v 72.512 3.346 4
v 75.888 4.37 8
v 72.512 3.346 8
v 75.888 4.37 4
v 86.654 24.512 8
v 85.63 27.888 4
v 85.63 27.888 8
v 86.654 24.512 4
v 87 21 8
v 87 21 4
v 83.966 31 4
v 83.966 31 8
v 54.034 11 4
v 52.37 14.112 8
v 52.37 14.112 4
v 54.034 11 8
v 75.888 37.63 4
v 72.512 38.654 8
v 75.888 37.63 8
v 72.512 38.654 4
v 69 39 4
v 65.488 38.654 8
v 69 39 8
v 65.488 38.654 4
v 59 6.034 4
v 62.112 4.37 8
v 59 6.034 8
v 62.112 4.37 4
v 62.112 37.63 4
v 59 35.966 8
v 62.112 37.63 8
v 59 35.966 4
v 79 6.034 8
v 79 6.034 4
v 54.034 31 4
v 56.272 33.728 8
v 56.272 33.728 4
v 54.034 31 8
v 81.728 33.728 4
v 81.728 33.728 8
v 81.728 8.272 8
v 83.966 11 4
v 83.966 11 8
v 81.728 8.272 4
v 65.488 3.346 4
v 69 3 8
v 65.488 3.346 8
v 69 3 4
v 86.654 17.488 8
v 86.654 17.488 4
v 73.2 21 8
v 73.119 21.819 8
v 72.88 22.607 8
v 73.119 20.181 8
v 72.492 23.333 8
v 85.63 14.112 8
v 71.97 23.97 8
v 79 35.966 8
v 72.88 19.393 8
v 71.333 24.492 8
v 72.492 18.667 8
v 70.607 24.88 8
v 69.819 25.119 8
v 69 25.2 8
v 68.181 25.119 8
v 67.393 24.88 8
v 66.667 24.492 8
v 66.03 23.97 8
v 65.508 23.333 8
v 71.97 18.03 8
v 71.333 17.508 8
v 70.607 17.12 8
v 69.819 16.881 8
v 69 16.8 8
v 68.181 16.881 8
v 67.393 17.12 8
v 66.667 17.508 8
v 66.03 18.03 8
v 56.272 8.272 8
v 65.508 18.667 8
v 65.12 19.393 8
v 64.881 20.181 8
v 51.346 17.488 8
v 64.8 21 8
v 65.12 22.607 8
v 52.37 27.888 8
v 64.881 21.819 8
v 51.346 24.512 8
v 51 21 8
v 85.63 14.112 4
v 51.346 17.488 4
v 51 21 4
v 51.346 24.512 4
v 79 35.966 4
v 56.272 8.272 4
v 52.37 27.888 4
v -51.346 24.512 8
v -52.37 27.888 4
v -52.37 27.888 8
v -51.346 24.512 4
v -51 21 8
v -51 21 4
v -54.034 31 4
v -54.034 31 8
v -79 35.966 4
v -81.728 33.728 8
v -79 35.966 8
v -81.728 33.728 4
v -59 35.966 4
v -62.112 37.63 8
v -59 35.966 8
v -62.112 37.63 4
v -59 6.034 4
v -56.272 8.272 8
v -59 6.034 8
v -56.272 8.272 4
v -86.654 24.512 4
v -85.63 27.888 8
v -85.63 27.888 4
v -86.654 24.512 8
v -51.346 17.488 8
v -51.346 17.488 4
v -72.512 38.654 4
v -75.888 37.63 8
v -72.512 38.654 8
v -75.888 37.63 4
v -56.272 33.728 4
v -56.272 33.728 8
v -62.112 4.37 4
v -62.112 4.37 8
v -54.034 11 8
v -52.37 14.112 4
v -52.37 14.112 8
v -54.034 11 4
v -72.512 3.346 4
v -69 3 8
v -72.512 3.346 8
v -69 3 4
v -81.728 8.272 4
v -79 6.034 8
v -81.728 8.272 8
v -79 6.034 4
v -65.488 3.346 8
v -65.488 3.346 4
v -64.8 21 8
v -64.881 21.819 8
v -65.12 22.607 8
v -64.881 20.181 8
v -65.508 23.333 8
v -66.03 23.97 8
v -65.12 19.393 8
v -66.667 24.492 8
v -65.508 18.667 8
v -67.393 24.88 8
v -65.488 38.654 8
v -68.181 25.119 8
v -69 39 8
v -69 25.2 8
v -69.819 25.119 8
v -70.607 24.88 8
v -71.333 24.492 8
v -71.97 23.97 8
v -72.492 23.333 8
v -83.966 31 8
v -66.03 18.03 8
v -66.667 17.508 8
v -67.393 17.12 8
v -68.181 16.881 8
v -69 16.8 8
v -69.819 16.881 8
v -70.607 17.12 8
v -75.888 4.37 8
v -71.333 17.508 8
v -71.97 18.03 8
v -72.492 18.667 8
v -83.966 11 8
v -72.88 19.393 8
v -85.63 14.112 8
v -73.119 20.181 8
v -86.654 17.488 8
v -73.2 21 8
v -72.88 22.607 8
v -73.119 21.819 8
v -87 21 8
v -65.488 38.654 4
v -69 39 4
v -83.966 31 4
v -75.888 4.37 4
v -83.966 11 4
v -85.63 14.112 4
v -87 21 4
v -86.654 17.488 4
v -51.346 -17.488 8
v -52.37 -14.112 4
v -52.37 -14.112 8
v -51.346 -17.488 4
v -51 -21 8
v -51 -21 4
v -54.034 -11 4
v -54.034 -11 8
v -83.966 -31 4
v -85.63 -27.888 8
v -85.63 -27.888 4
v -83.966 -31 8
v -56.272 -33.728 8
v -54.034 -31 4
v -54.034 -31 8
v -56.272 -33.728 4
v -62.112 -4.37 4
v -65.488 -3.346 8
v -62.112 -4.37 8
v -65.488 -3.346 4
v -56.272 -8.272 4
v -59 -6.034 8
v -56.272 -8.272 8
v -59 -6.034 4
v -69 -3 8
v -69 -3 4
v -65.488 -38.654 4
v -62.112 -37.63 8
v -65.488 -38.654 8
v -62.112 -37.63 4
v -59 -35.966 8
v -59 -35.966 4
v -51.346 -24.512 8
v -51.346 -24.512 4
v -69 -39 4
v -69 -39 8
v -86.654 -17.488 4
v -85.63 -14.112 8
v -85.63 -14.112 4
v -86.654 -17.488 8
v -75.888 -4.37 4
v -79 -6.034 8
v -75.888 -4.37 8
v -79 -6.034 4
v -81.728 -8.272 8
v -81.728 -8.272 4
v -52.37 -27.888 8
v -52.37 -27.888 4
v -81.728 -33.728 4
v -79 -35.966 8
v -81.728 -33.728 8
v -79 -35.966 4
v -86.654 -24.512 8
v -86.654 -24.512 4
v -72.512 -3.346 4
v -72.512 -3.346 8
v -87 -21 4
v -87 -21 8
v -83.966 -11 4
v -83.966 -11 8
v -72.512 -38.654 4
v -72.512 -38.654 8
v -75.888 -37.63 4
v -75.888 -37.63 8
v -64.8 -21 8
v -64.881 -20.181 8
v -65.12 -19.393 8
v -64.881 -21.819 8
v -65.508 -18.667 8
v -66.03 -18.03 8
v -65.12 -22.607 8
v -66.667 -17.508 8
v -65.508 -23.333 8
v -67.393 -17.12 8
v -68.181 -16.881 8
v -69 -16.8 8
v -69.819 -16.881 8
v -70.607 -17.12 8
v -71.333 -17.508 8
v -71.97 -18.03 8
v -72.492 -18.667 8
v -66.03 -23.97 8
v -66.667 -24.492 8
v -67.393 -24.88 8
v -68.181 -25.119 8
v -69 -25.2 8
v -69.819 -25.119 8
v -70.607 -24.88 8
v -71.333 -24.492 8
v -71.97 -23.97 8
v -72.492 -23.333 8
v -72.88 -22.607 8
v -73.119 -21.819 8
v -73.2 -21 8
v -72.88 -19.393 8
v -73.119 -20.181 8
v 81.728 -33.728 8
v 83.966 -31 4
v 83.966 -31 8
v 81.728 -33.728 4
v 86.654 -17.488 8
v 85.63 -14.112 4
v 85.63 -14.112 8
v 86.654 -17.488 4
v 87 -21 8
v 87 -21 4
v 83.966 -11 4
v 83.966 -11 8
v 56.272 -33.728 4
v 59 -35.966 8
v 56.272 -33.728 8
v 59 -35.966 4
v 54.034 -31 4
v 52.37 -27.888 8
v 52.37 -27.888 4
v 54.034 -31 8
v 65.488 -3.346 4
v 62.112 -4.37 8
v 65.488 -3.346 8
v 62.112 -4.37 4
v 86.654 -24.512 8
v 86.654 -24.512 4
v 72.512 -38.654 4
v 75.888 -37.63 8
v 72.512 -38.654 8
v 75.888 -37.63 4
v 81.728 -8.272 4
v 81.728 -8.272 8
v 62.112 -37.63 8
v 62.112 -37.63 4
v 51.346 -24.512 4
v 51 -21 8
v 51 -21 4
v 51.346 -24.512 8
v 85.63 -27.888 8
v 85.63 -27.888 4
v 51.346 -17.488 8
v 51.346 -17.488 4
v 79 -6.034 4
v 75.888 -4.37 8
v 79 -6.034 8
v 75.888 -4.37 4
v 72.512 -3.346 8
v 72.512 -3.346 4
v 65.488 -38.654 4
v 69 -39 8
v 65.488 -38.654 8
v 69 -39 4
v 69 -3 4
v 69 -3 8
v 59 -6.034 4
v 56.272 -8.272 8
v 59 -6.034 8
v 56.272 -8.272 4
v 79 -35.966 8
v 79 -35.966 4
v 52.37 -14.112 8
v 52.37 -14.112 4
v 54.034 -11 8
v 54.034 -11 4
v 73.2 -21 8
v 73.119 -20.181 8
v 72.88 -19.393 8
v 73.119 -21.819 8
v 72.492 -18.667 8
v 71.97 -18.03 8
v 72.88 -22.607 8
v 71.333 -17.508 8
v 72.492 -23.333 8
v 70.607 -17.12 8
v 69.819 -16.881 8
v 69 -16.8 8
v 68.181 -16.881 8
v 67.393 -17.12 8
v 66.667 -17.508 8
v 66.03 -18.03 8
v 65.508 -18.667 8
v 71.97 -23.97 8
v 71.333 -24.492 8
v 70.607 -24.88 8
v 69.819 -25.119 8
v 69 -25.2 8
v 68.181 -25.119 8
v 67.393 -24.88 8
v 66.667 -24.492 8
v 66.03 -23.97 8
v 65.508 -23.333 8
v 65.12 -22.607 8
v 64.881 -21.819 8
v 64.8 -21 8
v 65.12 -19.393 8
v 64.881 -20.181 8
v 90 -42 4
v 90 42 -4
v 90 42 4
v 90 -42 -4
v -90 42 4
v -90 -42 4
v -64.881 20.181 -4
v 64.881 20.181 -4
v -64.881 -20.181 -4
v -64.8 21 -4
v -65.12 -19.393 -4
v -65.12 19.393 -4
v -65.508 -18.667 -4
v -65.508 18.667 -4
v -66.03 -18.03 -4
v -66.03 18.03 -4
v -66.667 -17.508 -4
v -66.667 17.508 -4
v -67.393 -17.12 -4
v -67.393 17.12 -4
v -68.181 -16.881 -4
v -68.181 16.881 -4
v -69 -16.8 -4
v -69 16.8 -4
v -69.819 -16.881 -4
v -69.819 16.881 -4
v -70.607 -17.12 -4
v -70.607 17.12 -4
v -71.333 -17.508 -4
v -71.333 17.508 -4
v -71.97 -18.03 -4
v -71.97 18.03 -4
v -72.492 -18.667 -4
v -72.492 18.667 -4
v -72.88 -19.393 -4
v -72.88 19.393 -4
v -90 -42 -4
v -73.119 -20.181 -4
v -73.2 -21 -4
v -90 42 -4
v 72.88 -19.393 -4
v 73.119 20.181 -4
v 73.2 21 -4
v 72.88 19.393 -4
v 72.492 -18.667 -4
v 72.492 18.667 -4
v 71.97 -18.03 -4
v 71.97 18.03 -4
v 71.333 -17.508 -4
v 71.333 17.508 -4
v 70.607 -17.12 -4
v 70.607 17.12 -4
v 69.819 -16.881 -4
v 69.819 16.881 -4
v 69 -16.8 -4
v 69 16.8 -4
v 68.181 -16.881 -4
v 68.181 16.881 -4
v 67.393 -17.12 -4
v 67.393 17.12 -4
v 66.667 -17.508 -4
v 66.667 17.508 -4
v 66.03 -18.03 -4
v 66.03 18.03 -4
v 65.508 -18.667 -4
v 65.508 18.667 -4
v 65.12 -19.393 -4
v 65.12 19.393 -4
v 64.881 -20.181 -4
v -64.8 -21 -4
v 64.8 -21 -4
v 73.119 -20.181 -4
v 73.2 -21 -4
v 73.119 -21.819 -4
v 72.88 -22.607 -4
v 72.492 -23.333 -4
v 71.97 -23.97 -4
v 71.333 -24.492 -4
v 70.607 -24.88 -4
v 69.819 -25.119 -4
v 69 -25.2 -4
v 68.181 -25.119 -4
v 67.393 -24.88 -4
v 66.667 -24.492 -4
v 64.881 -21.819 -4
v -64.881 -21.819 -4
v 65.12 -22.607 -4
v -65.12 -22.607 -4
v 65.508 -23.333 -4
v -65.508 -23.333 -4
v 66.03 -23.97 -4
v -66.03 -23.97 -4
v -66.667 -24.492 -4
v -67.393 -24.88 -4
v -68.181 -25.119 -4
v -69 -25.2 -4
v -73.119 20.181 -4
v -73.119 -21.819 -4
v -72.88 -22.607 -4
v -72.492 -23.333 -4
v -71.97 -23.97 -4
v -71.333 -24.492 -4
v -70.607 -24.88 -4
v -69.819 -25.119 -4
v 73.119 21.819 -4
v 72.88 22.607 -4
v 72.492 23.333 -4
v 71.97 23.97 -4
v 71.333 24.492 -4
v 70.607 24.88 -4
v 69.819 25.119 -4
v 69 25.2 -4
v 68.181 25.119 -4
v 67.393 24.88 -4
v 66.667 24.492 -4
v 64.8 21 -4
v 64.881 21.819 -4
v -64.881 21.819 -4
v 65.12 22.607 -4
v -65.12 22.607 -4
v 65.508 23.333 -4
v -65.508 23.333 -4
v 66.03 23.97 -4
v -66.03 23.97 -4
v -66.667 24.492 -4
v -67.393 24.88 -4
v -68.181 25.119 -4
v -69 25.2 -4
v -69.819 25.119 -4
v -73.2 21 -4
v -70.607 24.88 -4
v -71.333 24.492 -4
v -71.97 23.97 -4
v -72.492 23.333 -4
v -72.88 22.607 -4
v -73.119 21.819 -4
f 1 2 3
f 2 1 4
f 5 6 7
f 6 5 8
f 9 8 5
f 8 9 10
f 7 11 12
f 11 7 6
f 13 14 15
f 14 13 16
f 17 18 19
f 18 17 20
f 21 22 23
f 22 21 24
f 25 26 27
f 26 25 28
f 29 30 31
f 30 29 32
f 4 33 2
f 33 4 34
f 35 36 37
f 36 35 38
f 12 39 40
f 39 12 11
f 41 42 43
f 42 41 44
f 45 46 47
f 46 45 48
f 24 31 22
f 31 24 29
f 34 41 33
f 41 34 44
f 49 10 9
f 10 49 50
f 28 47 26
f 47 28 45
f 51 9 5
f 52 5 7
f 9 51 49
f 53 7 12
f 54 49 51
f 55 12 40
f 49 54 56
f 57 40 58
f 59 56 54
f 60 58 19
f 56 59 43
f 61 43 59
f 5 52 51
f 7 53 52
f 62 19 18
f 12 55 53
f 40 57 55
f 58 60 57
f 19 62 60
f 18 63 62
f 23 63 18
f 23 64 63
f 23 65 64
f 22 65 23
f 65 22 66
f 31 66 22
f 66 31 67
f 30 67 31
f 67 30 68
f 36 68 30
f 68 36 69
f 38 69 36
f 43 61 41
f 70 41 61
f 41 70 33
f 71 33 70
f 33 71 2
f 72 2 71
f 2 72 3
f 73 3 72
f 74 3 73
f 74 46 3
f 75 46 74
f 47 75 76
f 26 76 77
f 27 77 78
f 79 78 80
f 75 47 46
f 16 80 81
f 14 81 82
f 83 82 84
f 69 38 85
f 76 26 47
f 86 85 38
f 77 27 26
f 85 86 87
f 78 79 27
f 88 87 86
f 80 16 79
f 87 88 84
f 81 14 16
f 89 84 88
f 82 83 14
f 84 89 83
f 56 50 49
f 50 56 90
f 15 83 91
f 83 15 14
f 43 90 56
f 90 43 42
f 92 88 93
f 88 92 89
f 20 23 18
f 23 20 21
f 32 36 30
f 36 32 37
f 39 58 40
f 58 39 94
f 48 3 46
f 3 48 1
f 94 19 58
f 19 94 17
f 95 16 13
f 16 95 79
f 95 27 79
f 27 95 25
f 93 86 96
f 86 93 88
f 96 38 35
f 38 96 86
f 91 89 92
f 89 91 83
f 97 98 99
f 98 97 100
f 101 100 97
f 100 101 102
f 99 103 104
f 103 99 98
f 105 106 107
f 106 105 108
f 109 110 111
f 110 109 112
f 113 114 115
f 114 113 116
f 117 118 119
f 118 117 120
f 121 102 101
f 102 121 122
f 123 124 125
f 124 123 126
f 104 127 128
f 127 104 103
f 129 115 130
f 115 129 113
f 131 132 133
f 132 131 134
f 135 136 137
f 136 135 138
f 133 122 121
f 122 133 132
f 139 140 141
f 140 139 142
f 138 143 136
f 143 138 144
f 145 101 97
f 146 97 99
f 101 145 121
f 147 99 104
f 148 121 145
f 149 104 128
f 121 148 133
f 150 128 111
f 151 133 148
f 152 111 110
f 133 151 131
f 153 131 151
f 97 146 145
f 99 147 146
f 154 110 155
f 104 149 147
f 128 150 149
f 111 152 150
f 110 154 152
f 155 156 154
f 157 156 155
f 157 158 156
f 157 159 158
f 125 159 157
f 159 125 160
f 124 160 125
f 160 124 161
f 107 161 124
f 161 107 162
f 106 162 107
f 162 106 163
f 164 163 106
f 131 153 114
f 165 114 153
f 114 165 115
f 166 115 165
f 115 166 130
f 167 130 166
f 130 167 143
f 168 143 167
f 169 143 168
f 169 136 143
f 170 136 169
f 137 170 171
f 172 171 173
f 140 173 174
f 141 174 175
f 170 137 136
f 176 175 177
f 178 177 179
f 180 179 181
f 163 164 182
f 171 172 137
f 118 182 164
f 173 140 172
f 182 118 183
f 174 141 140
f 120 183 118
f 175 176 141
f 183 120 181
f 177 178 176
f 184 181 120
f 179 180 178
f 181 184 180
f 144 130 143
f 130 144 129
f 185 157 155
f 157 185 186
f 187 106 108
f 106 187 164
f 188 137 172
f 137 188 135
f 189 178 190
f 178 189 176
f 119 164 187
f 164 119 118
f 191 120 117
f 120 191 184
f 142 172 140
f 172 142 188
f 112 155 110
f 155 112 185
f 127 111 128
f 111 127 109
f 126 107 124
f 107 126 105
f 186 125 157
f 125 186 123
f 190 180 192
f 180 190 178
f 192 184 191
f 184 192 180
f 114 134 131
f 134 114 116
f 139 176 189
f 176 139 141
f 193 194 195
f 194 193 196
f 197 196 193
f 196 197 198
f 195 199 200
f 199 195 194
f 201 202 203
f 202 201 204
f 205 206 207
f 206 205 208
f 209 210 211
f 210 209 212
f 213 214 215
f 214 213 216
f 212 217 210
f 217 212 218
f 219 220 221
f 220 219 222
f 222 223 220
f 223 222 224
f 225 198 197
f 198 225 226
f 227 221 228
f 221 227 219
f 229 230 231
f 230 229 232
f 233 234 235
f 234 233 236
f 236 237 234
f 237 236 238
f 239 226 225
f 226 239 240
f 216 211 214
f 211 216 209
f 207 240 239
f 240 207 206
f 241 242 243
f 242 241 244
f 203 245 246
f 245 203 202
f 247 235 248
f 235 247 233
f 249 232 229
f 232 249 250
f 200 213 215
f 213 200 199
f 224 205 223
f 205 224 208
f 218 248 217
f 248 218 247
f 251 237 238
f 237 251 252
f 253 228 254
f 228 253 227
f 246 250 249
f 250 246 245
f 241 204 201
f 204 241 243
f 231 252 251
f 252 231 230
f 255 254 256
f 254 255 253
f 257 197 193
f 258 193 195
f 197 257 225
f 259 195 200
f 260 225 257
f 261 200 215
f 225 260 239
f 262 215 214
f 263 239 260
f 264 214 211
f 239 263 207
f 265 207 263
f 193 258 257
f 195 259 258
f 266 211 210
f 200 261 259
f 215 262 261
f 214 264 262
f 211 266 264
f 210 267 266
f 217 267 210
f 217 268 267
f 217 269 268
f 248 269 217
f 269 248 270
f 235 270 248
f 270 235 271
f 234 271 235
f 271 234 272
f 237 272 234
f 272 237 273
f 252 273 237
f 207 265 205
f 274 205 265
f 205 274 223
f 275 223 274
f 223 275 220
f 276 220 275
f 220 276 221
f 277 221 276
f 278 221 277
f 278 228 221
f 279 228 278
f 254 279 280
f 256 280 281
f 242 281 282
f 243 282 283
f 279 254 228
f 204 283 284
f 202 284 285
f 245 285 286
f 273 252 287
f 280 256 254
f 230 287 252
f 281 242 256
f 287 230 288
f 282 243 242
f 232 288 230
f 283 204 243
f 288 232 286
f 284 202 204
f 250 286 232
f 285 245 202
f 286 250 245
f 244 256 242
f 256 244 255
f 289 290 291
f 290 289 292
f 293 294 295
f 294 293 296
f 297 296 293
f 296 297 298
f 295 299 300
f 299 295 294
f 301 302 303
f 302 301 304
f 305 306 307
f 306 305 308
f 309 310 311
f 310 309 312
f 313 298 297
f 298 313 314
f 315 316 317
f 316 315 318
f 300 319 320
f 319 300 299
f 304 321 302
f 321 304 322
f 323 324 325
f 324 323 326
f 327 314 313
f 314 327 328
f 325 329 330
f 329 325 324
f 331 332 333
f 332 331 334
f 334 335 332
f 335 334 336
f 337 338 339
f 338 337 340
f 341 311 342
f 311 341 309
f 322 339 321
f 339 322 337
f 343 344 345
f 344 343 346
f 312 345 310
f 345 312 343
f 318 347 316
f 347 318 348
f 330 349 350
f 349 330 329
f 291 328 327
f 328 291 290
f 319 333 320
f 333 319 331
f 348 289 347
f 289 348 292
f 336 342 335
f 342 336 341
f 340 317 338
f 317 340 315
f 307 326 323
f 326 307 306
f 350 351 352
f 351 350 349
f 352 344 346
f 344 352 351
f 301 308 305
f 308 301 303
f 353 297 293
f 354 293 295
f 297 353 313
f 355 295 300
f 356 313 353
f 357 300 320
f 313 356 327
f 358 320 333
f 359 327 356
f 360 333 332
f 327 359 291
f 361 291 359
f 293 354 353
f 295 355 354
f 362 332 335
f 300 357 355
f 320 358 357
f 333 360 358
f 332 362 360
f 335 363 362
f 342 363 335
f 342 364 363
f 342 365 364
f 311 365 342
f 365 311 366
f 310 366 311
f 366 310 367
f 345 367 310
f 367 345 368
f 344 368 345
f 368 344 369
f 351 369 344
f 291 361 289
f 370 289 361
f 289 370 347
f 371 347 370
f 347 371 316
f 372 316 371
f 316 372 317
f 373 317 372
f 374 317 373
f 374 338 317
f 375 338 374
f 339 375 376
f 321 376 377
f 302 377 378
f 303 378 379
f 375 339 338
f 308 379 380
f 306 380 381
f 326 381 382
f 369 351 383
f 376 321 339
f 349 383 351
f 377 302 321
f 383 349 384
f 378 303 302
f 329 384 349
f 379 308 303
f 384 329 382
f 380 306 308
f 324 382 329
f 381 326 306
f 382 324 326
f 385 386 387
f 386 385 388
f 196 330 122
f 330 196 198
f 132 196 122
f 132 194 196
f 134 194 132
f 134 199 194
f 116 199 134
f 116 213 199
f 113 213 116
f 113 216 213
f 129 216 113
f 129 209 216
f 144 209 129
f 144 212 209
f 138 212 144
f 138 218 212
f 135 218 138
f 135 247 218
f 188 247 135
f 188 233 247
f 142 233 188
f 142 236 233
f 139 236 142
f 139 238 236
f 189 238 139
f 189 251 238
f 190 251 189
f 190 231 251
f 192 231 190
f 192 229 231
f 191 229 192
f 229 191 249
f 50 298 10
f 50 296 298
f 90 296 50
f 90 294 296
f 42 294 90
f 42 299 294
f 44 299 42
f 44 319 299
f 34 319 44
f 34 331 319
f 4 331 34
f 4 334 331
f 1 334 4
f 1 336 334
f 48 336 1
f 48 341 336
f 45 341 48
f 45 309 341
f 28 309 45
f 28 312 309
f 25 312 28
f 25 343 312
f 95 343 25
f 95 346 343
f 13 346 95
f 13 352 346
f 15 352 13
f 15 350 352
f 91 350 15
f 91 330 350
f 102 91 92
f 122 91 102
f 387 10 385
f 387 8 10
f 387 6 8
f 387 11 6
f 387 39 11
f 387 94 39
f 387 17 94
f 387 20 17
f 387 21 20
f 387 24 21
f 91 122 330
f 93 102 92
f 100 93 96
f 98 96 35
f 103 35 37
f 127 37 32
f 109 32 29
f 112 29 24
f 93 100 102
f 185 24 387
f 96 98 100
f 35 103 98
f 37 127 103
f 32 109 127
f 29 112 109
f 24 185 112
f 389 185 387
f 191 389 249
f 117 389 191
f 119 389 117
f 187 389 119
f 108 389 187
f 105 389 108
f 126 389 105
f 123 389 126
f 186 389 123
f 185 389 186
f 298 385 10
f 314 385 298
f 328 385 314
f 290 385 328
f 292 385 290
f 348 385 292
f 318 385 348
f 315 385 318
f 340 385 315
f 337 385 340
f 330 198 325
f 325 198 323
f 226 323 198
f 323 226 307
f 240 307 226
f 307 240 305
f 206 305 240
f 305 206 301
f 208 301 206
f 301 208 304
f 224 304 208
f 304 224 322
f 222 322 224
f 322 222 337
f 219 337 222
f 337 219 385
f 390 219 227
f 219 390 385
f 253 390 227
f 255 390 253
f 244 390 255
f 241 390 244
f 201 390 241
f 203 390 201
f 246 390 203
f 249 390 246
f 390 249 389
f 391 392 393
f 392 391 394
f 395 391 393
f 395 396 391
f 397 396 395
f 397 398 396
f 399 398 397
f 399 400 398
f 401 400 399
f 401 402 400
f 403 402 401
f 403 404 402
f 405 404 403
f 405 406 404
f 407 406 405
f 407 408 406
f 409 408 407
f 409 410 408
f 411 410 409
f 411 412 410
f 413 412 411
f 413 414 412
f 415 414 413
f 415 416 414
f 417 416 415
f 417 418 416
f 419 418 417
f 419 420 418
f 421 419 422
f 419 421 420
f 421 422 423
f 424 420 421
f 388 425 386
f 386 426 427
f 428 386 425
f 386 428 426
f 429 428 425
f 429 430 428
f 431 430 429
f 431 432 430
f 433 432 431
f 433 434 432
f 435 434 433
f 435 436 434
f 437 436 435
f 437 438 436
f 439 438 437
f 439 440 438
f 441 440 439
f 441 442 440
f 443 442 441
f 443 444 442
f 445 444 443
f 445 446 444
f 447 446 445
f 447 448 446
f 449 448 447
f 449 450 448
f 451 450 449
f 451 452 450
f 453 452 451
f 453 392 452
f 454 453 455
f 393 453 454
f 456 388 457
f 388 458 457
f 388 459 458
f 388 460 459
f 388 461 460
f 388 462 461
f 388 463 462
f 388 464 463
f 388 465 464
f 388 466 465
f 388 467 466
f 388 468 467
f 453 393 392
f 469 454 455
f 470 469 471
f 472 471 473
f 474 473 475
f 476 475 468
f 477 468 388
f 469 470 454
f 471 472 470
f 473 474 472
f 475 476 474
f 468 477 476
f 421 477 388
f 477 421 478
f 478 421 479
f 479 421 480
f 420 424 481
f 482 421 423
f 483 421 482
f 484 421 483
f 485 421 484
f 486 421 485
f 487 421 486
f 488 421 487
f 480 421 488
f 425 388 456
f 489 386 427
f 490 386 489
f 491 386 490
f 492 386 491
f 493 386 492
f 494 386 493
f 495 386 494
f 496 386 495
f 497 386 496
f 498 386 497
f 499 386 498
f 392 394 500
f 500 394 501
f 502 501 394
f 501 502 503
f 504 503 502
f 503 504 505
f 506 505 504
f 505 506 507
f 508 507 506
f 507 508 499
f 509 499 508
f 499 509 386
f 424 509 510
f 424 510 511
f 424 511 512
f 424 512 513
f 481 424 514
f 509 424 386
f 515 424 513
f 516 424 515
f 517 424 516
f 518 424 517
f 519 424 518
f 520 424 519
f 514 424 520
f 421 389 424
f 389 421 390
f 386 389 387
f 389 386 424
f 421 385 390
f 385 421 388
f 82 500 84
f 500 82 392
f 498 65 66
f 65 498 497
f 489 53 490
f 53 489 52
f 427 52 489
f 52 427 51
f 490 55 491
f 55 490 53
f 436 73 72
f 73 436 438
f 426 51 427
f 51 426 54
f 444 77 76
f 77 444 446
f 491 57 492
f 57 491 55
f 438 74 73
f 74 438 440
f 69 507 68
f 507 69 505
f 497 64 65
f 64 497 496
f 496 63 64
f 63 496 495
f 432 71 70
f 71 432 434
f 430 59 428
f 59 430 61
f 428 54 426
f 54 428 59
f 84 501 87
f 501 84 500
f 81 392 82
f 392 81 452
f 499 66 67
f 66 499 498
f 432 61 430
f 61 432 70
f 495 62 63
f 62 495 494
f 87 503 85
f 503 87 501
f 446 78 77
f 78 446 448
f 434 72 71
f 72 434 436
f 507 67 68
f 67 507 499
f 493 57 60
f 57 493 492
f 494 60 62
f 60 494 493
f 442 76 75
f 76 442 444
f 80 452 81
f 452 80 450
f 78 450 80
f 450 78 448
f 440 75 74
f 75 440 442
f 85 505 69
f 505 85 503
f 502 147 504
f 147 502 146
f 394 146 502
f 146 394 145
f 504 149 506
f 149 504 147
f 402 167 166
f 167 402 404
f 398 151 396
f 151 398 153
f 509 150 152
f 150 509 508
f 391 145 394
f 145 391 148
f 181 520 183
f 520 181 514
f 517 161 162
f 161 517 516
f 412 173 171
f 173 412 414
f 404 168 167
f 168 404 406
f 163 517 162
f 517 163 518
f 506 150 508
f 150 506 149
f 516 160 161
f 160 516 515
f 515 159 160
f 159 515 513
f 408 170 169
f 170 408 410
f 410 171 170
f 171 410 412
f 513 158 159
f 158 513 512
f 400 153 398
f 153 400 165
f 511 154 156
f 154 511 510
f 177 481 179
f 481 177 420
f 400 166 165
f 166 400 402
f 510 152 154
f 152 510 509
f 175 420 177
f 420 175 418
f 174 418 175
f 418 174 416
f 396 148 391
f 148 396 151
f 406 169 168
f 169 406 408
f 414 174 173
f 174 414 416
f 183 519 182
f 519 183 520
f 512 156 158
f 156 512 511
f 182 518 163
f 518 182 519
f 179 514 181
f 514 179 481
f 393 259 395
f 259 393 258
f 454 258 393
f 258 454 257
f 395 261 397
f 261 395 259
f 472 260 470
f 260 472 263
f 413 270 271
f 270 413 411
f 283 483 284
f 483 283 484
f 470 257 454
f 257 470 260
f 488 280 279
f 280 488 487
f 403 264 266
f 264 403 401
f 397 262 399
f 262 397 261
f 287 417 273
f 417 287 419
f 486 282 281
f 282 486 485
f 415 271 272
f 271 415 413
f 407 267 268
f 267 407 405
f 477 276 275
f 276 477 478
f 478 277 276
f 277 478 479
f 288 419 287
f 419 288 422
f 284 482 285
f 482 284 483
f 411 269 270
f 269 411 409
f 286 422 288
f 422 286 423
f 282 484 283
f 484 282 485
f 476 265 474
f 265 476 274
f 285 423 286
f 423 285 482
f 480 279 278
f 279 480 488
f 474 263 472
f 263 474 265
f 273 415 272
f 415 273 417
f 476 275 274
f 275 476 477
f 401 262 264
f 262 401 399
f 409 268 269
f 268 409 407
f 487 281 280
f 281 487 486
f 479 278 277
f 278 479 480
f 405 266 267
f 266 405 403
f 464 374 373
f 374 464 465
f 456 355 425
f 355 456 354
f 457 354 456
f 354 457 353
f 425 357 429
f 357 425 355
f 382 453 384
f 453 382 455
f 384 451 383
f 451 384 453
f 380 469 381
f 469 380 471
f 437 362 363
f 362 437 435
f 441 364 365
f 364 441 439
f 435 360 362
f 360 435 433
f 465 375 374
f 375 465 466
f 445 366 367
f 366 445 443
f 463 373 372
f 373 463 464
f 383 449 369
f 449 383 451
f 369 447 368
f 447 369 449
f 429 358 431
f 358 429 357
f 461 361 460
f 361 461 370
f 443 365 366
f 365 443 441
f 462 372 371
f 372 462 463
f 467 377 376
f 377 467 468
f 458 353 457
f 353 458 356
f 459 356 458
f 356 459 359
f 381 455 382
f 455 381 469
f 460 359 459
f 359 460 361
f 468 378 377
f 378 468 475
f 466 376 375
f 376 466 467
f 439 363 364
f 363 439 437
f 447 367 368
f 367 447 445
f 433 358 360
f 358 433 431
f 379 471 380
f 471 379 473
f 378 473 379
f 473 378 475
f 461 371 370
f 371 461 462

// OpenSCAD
$fn = 32;

// ----------------------------------------------------------------------
// Anchor pads 180 x 84 x 12
// four corner bosses with anchor holes
// ----------------------------------------------------------------------

// --- parameters (mm) ---
plate = [180, 84, 8];  // base plate size (x, y, z)
pads = 4;              // boss count, one per corner
edge = 21;             // boss centre offset from the plate edge
boss_d = 36;           // boss diameter
boss_h = 4;            // boss height above the base plate
hole_d = 8.4;          // hole diameter

// --- derived feature positions (mm) ---
height = plate[2] + boss_h;      // = 12   overall height of the part
corner_x = plate[0] / 2 - edge;  // = 69   boss centre X
corner_y = plate[1] / 2 - edge;  // = 21   boss centre Y
feature_centers = [
  [corner_x, corner_y],
  [-corner_x, corner_y],
  [-corner_x, -corner_y],
  [corner_x, -corner_y]
];   // boss centres, anchor holes are drilled there

// base plate, four bosses standing on it, anchor holes all the way through
difference() {
  union() {
    cube(plate, center = true);
    for (centre = feature_centers)
      translate([centre[0], centre[1], plate[2] / 2 - 1])
        cylinder(d = boss_d, h = boss_h + 1);
  }
  for (centre = feature_centers)
    translate([centre[0], centre[1], -height])
      cylinder(d = hole_d, h = 2 * height + 2);  // through boss and plate
}
